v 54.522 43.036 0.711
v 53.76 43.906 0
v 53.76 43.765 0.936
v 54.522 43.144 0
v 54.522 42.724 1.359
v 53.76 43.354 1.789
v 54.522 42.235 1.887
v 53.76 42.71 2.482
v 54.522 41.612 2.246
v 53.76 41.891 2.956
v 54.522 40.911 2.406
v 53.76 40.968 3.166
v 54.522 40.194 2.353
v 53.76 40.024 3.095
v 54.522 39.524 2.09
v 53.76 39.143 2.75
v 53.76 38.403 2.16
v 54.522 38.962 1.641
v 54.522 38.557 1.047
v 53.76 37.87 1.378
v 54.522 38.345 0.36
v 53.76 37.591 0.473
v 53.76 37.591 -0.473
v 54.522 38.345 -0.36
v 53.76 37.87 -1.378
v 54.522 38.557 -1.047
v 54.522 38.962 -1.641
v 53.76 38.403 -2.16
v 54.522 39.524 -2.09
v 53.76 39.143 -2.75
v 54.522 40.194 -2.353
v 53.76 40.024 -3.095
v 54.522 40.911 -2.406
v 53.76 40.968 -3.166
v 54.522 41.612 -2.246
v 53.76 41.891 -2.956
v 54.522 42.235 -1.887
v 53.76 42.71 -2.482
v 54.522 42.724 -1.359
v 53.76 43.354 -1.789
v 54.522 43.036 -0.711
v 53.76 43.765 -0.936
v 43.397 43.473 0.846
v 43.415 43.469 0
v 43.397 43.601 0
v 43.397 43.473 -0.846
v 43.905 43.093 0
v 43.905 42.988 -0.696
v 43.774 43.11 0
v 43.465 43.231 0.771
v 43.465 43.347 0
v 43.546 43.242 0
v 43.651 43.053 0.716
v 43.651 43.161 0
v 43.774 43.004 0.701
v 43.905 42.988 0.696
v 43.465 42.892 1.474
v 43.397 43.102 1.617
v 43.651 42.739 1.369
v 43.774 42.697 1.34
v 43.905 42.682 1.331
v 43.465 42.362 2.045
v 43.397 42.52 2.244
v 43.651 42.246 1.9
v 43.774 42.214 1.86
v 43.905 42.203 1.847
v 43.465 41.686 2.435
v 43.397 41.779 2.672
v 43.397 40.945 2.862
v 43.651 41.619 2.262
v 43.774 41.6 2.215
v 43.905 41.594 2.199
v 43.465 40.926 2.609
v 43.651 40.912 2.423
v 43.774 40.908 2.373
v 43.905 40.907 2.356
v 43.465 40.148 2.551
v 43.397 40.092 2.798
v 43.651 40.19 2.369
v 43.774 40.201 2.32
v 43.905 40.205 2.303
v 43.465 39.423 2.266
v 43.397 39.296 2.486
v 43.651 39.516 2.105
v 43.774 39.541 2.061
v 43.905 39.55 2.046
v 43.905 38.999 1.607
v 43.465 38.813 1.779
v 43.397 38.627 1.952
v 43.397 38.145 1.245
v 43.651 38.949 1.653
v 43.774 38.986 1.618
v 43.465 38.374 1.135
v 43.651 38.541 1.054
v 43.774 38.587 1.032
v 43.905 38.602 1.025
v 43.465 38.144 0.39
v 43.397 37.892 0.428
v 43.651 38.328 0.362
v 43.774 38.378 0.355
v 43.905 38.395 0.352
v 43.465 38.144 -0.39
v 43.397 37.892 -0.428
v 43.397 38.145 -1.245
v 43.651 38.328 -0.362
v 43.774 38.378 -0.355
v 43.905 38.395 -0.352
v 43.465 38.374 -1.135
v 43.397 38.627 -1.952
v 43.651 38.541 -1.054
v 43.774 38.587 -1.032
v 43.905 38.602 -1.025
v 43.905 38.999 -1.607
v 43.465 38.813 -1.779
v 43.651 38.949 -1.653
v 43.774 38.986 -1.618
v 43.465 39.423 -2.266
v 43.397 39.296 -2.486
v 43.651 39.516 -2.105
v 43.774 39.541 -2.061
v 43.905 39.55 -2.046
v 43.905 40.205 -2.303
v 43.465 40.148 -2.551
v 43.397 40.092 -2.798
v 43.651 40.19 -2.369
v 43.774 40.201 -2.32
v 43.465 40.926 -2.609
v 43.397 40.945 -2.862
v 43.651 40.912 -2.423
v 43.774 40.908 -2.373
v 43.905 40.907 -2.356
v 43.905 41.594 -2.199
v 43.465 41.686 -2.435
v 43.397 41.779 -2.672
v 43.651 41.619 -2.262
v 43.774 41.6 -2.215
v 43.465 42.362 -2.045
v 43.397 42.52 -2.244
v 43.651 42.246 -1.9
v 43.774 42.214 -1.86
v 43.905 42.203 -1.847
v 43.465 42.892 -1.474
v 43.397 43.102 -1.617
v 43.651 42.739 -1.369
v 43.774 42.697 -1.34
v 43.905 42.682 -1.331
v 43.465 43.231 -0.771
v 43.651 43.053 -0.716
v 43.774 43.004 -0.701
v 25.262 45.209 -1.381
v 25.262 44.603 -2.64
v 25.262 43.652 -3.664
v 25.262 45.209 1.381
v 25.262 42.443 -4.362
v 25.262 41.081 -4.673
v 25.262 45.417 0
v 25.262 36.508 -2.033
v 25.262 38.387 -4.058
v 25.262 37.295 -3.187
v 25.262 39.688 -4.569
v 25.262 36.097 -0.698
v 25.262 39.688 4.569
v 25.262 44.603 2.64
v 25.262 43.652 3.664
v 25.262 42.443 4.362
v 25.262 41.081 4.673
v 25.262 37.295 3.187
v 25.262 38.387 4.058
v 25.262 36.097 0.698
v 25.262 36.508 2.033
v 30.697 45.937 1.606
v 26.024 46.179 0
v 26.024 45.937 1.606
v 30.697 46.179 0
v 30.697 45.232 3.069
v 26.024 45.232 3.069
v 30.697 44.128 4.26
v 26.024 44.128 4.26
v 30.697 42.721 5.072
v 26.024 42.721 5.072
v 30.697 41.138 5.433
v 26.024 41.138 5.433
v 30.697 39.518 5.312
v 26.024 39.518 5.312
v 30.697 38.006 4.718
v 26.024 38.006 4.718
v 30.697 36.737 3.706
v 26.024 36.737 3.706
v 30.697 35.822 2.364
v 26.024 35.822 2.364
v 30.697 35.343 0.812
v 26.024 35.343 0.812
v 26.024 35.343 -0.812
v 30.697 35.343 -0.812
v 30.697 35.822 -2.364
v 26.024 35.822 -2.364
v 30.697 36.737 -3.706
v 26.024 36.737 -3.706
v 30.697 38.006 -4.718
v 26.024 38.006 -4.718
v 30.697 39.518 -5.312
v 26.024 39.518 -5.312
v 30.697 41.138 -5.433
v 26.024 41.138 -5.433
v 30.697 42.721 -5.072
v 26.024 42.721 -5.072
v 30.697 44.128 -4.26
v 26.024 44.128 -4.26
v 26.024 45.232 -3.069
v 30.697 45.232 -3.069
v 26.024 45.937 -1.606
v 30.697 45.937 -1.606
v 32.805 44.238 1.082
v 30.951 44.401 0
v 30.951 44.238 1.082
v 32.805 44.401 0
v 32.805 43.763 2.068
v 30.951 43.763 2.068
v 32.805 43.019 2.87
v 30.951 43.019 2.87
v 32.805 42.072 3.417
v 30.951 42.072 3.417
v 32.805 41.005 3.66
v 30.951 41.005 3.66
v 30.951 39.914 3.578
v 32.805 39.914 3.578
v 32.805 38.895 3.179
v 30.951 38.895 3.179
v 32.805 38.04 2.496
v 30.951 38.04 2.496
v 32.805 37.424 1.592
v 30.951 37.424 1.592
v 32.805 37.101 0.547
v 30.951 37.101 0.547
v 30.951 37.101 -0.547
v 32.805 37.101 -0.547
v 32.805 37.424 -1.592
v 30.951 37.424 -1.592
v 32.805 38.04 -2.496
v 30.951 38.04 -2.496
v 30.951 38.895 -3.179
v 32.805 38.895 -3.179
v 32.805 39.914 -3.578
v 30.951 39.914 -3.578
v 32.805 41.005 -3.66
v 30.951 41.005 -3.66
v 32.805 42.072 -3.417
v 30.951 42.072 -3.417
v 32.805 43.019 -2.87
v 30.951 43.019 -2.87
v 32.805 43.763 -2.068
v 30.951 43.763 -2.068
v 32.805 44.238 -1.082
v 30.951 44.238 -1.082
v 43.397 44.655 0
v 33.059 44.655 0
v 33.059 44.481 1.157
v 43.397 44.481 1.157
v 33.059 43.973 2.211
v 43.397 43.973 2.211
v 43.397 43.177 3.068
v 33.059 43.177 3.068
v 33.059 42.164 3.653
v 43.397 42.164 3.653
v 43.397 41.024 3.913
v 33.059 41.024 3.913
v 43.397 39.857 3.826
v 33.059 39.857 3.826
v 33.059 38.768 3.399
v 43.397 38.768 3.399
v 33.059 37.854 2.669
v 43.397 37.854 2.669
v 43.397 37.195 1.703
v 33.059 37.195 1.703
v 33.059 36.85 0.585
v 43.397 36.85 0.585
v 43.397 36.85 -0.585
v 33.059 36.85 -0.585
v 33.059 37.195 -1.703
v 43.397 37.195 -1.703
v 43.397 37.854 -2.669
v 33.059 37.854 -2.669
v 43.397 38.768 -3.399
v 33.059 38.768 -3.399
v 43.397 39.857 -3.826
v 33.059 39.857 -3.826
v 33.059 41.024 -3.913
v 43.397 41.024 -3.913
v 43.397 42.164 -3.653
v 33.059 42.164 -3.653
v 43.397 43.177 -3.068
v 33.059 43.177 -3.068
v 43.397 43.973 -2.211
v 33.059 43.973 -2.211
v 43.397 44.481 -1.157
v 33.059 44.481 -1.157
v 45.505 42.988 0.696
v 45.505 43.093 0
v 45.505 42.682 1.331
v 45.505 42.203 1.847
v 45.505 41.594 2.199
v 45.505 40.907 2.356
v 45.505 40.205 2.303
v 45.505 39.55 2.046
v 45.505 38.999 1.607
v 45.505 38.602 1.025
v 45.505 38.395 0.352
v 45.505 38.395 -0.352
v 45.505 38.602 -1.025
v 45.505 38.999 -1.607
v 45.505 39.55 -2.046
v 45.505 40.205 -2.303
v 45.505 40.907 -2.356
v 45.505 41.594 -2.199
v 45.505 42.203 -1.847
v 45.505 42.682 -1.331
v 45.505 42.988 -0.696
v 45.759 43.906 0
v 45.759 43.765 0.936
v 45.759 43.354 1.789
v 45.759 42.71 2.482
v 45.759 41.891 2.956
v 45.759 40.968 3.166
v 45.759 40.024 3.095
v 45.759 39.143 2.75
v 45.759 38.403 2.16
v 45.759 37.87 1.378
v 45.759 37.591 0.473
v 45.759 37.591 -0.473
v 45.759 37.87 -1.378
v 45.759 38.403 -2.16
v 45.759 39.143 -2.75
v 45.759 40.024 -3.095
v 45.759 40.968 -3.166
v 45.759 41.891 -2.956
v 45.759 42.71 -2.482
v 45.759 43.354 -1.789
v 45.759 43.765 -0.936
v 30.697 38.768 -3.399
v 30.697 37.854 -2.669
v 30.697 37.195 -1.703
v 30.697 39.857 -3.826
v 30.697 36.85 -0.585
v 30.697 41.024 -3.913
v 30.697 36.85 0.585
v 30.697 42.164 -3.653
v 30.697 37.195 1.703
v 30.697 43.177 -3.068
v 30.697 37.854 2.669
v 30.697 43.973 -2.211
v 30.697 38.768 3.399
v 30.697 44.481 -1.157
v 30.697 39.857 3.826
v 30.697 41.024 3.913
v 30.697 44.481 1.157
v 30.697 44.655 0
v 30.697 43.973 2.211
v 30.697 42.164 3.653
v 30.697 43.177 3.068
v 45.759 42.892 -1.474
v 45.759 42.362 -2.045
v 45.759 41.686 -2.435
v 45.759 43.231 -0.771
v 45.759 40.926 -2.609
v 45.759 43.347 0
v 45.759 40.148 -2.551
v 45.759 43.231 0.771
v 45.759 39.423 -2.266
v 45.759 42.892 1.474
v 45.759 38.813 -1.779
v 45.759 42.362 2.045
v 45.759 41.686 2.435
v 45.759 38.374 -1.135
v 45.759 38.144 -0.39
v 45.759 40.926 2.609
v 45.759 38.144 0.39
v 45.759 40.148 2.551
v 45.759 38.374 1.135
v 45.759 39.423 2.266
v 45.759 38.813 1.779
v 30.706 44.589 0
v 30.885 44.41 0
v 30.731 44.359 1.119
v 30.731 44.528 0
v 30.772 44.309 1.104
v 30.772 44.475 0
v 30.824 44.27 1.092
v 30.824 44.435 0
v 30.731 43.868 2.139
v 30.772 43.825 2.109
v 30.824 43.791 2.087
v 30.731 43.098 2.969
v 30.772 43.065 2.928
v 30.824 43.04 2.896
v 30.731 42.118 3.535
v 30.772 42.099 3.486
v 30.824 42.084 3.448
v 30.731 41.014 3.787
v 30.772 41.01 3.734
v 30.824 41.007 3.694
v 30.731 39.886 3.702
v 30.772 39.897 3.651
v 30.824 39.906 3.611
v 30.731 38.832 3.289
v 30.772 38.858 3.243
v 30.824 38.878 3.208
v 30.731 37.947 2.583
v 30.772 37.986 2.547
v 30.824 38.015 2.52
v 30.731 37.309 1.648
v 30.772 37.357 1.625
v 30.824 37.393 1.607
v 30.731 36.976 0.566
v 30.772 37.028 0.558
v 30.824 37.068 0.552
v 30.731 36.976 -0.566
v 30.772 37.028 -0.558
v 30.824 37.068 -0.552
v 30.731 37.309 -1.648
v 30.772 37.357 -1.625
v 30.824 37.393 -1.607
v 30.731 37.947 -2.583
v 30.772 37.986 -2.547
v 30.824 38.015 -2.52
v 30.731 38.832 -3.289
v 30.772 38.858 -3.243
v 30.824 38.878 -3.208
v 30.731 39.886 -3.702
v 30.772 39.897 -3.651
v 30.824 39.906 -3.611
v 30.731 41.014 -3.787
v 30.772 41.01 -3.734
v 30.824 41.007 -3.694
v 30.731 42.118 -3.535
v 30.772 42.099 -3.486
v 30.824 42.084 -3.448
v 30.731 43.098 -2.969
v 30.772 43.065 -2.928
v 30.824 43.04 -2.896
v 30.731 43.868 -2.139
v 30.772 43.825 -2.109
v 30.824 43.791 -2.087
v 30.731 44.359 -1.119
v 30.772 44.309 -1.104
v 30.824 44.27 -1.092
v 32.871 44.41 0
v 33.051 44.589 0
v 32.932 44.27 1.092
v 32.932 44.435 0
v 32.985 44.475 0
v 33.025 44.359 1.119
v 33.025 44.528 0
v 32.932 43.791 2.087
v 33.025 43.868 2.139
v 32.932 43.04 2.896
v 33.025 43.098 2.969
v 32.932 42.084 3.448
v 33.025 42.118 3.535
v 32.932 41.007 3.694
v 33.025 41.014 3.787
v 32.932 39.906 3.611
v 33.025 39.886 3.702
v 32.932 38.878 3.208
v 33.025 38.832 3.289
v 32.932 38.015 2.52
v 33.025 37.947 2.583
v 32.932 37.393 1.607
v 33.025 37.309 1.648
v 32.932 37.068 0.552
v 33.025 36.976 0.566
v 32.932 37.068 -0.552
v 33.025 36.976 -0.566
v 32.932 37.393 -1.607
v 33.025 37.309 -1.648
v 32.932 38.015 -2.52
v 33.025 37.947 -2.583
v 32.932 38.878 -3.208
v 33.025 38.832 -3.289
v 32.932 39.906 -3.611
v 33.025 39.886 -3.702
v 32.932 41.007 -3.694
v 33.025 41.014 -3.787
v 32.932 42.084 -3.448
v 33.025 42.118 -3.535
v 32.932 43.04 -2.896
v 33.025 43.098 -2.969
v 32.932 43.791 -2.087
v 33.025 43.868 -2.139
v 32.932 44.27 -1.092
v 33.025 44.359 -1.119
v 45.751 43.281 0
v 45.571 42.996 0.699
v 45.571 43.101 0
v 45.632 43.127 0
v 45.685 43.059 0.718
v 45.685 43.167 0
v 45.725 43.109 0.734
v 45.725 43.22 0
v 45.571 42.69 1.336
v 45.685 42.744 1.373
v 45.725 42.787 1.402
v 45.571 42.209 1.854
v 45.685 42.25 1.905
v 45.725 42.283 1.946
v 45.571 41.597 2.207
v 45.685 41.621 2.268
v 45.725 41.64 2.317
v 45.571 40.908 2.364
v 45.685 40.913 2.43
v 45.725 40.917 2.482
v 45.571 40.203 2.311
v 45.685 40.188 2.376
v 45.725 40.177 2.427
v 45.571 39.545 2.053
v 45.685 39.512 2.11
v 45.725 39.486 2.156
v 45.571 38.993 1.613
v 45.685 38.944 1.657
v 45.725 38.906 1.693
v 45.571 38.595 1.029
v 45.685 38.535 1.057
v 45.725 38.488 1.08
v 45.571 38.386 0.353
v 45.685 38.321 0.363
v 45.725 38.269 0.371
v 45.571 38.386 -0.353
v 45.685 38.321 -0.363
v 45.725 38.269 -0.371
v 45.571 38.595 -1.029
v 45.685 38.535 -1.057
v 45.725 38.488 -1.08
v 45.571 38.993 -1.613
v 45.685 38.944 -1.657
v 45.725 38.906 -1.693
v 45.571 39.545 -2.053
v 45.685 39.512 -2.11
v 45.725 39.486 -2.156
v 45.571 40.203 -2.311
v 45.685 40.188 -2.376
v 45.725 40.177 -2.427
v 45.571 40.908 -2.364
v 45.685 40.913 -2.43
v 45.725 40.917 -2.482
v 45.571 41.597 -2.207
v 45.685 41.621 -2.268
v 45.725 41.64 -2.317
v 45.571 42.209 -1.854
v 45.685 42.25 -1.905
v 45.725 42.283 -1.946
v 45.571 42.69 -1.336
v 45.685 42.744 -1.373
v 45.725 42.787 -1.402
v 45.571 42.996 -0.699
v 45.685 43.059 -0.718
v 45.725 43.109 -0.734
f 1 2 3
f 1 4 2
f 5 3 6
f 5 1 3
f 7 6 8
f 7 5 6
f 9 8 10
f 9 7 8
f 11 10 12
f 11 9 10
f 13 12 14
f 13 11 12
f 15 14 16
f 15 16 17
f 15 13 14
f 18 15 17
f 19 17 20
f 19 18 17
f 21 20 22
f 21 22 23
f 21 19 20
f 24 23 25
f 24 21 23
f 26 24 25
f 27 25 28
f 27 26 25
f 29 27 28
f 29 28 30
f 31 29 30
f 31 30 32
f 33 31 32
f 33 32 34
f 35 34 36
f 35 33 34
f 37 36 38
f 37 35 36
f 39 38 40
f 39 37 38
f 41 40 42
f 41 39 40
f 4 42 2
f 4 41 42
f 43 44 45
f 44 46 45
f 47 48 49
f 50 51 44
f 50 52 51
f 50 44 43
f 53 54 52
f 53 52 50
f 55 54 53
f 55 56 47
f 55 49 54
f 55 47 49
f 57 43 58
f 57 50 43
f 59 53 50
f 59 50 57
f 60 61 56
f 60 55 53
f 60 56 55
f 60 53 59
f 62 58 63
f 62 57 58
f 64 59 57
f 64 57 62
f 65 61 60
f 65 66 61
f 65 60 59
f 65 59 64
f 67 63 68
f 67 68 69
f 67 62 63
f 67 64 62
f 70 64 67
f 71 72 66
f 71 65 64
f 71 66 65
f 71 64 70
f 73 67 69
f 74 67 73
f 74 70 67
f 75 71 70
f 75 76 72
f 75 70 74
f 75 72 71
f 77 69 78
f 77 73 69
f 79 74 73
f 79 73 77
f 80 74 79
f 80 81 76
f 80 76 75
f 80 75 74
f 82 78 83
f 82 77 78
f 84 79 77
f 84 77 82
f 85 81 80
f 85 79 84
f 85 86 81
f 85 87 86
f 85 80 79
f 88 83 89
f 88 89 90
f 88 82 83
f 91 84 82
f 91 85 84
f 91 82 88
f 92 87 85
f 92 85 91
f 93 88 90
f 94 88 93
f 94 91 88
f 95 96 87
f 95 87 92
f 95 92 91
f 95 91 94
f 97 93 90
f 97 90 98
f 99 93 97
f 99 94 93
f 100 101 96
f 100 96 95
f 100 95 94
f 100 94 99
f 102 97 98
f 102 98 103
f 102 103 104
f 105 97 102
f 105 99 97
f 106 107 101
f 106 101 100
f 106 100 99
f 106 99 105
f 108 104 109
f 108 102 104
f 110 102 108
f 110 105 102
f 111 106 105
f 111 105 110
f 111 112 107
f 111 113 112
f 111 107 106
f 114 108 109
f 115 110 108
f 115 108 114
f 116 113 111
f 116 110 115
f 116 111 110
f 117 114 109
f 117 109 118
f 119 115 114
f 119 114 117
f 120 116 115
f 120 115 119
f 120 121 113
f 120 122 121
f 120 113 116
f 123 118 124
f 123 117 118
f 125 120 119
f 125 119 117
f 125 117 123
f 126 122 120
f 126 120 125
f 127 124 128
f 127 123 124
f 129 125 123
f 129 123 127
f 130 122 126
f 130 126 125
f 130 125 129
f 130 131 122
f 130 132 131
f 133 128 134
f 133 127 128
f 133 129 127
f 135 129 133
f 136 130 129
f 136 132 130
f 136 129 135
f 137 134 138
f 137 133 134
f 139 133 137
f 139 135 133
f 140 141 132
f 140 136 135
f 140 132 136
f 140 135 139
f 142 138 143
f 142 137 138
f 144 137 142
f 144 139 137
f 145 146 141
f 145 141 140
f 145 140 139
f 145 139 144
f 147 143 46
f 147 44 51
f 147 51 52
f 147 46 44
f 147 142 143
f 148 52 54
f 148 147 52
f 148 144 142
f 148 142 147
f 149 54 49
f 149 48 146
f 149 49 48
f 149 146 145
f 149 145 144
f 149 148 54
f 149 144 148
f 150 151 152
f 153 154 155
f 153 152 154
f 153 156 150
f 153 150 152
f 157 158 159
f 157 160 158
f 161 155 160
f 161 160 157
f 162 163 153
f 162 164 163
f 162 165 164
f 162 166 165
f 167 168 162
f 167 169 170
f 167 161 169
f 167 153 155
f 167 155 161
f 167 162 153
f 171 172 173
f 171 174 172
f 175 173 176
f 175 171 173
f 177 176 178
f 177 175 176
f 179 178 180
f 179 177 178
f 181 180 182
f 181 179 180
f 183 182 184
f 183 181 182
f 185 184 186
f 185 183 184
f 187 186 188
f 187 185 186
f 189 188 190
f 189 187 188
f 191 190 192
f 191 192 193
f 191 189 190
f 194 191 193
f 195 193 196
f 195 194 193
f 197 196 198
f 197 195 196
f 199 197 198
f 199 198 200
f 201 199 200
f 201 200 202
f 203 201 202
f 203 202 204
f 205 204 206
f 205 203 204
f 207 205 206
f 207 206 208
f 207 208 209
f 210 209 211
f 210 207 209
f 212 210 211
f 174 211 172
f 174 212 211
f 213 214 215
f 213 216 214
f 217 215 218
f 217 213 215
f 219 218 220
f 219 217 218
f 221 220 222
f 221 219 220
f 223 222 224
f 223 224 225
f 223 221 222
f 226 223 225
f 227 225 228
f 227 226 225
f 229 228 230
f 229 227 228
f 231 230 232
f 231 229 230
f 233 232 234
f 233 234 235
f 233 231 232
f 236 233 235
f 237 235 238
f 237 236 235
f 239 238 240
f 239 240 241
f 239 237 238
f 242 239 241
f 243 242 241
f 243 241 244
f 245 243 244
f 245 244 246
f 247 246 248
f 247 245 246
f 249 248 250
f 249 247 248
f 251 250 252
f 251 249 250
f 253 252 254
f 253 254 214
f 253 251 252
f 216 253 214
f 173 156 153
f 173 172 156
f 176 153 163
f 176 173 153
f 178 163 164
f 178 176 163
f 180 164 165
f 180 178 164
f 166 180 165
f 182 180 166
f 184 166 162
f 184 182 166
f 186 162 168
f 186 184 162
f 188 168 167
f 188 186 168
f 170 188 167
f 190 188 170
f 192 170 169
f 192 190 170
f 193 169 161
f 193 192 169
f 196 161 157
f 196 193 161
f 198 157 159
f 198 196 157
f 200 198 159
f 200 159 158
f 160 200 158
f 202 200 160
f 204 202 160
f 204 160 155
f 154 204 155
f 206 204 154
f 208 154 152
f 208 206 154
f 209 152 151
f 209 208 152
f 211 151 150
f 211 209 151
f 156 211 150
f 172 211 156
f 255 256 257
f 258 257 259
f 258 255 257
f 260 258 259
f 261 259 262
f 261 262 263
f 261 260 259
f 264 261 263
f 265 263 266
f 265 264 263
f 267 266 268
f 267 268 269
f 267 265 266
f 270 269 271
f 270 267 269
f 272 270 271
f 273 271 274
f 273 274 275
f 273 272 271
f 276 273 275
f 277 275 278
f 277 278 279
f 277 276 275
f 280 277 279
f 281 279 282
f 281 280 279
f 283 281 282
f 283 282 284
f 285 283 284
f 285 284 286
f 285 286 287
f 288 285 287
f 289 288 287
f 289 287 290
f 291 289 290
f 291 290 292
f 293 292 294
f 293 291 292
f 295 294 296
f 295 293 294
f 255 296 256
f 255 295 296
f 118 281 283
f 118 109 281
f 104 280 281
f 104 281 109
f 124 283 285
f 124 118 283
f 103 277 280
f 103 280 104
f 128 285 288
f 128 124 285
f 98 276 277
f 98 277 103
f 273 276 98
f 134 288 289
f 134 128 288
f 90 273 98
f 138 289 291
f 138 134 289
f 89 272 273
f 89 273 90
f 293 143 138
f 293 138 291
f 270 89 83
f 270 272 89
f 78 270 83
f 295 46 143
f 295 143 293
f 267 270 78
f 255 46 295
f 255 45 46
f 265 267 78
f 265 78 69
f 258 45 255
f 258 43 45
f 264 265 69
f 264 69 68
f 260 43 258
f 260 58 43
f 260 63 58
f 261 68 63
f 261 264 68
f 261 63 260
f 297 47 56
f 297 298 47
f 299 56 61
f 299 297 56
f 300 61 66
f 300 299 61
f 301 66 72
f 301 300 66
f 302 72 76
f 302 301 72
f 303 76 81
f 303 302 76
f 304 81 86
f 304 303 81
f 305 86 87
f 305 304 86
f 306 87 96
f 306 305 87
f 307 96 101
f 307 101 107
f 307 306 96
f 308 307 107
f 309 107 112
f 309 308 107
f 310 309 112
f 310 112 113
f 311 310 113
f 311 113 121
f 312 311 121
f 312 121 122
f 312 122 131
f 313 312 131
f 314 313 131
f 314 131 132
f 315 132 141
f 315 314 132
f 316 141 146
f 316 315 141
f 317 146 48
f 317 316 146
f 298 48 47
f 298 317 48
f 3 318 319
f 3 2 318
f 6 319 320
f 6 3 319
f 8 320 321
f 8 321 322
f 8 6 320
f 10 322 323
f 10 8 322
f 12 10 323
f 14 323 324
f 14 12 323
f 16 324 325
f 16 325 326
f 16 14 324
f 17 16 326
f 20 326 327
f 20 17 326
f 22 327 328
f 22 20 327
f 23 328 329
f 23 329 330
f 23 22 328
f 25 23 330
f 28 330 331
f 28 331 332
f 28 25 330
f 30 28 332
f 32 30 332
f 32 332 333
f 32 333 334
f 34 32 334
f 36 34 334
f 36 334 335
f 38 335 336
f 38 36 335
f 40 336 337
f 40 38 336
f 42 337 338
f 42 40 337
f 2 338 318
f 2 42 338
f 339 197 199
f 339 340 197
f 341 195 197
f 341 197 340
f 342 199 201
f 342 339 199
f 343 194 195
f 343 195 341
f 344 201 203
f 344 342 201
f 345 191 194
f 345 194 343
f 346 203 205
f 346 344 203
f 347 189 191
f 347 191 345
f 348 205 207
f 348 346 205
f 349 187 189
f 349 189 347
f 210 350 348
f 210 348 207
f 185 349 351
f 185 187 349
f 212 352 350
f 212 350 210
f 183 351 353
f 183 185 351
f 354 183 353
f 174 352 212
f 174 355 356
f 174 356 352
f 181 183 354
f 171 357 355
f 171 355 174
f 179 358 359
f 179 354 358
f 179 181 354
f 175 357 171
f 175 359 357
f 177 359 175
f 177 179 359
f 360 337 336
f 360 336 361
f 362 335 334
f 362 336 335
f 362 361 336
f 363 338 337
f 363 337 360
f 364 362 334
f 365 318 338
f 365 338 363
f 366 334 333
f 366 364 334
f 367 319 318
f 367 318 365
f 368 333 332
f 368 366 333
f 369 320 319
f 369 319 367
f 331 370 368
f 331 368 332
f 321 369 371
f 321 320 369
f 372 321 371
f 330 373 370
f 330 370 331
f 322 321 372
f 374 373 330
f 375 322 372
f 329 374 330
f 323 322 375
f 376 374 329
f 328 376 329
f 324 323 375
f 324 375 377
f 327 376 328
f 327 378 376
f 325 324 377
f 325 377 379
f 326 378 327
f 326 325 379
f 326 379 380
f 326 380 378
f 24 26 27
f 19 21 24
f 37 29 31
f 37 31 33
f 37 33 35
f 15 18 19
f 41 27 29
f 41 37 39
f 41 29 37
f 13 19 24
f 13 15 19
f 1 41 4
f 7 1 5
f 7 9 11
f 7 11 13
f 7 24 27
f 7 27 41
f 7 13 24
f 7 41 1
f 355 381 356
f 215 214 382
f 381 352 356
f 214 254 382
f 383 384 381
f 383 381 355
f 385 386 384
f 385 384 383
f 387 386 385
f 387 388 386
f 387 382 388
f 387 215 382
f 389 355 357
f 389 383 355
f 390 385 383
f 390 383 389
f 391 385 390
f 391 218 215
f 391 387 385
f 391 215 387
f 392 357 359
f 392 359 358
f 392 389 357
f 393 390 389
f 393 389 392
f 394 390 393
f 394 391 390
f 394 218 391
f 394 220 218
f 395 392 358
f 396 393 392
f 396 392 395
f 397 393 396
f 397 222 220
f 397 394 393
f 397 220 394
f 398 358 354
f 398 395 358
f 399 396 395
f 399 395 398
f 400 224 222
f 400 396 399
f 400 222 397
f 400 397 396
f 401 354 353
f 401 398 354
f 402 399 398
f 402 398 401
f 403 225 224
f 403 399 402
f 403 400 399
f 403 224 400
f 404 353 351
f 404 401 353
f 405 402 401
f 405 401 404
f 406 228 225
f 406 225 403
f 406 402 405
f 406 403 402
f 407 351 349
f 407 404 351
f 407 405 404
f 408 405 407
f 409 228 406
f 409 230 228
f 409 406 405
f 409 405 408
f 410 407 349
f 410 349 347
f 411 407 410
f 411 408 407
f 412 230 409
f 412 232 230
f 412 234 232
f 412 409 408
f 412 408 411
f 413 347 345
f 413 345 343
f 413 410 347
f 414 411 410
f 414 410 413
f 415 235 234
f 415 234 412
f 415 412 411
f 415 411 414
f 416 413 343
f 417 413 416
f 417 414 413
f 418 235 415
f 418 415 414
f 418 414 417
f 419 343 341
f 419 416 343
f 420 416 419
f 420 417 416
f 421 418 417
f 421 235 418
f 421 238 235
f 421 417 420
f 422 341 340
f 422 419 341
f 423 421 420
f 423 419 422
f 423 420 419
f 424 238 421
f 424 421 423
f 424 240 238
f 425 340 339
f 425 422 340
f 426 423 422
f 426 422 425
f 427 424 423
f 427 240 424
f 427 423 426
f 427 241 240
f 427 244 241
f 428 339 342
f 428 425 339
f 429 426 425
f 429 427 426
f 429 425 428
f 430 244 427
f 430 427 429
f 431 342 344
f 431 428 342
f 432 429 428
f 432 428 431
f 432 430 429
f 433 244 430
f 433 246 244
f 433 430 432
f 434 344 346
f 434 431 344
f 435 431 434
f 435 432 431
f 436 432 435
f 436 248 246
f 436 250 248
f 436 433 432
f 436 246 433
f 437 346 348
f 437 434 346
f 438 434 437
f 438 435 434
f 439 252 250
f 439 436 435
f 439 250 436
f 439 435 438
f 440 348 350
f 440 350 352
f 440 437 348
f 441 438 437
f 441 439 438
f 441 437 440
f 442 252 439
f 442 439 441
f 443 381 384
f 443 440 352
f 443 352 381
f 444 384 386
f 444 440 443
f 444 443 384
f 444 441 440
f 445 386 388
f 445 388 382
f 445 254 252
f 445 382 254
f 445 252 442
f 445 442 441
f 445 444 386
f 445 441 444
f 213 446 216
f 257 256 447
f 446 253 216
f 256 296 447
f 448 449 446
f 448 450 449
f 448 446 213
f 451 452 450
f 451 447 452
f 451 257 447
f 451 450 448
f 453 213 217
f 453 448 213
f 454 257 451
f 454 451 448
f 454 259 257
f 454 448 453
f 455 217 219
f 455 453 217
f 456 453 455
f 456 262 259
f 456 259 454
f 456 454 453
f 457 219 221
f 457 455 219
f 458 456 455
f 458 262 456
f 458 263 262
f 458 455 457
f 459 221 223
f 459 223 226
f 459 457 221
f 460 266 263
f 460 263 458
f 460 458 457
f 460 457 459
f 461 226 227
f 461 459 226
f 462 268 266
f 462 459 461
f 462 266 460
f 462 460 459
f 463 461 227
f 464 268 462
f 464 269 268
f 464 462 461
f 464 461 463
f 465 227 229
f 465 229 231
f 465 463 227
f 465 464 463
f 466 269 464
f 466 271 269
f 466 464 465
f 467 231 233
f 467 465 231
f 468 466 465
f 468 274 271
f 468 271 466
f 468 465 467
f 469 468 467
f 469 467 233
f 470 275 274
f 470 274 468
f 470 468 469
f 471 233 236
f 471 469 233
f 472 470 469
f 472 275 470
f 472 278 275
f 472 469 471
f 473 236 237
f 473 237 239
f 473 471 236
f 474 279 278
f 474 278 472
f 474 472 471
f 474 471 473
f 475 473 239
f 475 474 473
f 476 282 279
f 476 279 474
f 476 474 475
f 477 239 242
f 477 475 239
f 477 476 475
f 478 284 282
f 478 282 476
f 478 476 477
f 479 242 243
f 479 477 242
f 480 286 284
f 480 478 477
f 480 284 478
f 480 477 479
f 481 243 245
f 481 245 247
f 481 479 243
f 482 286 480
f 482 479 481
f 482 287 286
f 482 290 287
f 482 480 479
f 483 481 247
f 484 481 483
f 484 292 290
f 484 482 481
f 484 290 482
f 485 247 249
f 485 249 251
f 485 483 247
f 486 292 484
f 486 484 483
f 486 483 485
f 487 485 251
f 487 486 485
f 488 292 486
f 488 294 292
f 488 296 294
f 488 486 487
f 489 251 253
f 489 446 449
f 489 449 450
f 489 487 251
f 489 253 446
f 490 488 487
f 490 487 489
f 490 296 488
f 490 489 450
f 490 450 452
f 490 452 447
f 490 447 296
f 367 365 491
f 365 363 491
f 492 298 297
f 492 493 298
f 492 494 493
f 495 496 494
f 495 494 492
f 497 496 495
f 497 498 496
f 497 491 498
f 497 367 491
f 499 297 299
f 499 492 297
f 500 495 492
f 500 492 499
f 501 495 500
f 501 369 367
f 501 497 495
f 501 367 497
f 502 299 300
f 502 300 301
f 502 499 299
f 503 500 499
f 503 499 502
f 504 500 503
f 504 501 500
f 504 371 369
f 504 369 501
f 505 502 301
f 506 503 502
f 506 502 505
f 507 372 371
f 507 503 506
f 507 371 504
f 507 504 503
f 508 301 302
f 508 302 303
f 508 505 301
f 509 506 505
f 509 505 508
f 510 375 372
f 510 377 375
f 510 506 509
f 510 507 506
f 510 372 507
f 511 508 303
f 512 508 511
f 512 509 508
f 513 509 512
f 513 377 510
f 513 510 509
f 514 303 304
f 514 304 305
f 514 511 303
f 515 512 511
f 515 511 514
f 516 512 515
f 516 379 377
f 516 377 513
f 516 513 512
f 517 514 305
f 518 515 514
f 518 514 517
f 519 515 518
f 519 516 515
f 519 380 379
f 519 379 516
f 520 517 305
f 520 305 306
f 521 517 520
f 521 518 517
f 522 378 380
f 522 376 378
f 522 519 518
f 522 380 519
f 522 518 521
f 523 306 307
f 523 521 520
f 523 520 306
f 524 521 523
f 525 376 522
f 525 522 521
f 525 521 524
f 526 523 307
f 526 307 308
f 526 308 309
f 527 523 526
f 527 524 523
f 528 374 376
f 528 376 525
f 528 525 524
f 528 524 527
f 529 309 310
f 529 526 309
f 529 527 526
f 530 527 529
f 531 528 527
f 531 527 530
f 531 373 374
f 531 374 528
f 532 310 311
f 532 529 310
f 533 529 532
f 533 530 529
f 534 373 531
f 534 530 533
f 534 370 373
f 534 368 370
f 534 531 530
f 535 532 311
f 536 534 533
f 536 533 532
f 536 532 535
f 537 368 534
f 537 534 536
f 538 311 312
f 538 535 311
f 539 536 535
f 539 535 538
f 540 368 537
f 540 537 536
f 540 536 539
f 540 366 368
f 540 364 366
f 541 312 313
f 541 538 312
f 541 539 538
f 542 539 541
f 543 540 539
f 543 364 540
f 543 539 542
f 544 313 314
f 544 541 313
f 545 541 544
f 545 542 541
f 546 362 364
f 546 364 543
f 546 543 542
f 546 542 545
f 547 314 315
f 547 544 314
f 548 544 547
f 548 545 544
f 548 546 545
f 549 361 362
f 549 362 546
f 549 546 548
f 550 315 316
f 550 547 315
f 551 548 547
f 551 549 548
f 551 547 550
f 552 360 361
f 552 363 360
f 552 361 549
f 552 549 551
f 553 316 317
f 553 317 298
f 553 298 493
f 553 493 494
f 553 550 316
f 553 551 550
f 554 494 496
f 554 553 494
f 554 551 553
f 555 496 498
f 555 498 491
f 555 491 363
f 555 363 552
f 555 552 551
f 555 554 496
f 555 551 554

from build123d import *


with BuildPart() as part:
    # Sketch1 → Revolve1 (revolve)
    with BuildSketch(Plane.XY):
        with BuildLine():
            Line((26.023627587, 46.178938329), (30.697227587, 46.178938329))
            Line((30.697227587, 46.178938329), (30.697227587, 44.908938329))
            Line((30.697227587, 44.908938329), (30.697227587, 44.654938329))
            ThreePointArc((30.697227587, 44.654938329), (30.771622465, 44.475333206), (30.951227587, 44.400938329))
            Line((30.951227587, 44.400938329), (31.205227587, 44.400938329))
            Line((31.205227587, 44.400938329), (32.805427587, 44.400938329))
            ThreePointArc((32.805427587, 44.400938329), (32.98503271, 44.475333206), (33.059427587, 44.654938329))
            Line((33.059427587, 44.654938329), (43.397227587, 44.654938329))
            Line((43.397227587, 44.654938329), (43.397227587, 43.600838329))
            ThreePointArc((43.397227587, 43.600838329), (43.546017342, 43.241628084), (43.905227587, 43.092838329))
            Line((43.905227587, 43.092838329), (45.505427587, 43.092838329))
            ThreePointArc((45.505427587, 43.092838329), (45.68503271, 43.167233206), (45.759427587, 43.346838329))
            Line((45.759427587, 43.346838329), (45.759427587, 43.905638329))
            Line((45.759427587, 43.905638329), (53.760427587, 43.905638329))
            Line((53.760427587, 43.905638329), (54.522427587, 43.143638329))
            Line((54.522427587, 43.143638329), (54.522427587, 40.730638329))
            Line((54.522427587, 40.730638329), (25.261627587, 40.730638329))
            Line((25.261627587, 40.730638329), (25.261627587, 45.416938329))
            Line((25.261627587, 45.416938329), (26.023627587, 46.178938329))
        make_face()
    revolve(axis=Axis((25.261627587, 40.730638329, 0), (1, 0, 0)))


solid = part.part
